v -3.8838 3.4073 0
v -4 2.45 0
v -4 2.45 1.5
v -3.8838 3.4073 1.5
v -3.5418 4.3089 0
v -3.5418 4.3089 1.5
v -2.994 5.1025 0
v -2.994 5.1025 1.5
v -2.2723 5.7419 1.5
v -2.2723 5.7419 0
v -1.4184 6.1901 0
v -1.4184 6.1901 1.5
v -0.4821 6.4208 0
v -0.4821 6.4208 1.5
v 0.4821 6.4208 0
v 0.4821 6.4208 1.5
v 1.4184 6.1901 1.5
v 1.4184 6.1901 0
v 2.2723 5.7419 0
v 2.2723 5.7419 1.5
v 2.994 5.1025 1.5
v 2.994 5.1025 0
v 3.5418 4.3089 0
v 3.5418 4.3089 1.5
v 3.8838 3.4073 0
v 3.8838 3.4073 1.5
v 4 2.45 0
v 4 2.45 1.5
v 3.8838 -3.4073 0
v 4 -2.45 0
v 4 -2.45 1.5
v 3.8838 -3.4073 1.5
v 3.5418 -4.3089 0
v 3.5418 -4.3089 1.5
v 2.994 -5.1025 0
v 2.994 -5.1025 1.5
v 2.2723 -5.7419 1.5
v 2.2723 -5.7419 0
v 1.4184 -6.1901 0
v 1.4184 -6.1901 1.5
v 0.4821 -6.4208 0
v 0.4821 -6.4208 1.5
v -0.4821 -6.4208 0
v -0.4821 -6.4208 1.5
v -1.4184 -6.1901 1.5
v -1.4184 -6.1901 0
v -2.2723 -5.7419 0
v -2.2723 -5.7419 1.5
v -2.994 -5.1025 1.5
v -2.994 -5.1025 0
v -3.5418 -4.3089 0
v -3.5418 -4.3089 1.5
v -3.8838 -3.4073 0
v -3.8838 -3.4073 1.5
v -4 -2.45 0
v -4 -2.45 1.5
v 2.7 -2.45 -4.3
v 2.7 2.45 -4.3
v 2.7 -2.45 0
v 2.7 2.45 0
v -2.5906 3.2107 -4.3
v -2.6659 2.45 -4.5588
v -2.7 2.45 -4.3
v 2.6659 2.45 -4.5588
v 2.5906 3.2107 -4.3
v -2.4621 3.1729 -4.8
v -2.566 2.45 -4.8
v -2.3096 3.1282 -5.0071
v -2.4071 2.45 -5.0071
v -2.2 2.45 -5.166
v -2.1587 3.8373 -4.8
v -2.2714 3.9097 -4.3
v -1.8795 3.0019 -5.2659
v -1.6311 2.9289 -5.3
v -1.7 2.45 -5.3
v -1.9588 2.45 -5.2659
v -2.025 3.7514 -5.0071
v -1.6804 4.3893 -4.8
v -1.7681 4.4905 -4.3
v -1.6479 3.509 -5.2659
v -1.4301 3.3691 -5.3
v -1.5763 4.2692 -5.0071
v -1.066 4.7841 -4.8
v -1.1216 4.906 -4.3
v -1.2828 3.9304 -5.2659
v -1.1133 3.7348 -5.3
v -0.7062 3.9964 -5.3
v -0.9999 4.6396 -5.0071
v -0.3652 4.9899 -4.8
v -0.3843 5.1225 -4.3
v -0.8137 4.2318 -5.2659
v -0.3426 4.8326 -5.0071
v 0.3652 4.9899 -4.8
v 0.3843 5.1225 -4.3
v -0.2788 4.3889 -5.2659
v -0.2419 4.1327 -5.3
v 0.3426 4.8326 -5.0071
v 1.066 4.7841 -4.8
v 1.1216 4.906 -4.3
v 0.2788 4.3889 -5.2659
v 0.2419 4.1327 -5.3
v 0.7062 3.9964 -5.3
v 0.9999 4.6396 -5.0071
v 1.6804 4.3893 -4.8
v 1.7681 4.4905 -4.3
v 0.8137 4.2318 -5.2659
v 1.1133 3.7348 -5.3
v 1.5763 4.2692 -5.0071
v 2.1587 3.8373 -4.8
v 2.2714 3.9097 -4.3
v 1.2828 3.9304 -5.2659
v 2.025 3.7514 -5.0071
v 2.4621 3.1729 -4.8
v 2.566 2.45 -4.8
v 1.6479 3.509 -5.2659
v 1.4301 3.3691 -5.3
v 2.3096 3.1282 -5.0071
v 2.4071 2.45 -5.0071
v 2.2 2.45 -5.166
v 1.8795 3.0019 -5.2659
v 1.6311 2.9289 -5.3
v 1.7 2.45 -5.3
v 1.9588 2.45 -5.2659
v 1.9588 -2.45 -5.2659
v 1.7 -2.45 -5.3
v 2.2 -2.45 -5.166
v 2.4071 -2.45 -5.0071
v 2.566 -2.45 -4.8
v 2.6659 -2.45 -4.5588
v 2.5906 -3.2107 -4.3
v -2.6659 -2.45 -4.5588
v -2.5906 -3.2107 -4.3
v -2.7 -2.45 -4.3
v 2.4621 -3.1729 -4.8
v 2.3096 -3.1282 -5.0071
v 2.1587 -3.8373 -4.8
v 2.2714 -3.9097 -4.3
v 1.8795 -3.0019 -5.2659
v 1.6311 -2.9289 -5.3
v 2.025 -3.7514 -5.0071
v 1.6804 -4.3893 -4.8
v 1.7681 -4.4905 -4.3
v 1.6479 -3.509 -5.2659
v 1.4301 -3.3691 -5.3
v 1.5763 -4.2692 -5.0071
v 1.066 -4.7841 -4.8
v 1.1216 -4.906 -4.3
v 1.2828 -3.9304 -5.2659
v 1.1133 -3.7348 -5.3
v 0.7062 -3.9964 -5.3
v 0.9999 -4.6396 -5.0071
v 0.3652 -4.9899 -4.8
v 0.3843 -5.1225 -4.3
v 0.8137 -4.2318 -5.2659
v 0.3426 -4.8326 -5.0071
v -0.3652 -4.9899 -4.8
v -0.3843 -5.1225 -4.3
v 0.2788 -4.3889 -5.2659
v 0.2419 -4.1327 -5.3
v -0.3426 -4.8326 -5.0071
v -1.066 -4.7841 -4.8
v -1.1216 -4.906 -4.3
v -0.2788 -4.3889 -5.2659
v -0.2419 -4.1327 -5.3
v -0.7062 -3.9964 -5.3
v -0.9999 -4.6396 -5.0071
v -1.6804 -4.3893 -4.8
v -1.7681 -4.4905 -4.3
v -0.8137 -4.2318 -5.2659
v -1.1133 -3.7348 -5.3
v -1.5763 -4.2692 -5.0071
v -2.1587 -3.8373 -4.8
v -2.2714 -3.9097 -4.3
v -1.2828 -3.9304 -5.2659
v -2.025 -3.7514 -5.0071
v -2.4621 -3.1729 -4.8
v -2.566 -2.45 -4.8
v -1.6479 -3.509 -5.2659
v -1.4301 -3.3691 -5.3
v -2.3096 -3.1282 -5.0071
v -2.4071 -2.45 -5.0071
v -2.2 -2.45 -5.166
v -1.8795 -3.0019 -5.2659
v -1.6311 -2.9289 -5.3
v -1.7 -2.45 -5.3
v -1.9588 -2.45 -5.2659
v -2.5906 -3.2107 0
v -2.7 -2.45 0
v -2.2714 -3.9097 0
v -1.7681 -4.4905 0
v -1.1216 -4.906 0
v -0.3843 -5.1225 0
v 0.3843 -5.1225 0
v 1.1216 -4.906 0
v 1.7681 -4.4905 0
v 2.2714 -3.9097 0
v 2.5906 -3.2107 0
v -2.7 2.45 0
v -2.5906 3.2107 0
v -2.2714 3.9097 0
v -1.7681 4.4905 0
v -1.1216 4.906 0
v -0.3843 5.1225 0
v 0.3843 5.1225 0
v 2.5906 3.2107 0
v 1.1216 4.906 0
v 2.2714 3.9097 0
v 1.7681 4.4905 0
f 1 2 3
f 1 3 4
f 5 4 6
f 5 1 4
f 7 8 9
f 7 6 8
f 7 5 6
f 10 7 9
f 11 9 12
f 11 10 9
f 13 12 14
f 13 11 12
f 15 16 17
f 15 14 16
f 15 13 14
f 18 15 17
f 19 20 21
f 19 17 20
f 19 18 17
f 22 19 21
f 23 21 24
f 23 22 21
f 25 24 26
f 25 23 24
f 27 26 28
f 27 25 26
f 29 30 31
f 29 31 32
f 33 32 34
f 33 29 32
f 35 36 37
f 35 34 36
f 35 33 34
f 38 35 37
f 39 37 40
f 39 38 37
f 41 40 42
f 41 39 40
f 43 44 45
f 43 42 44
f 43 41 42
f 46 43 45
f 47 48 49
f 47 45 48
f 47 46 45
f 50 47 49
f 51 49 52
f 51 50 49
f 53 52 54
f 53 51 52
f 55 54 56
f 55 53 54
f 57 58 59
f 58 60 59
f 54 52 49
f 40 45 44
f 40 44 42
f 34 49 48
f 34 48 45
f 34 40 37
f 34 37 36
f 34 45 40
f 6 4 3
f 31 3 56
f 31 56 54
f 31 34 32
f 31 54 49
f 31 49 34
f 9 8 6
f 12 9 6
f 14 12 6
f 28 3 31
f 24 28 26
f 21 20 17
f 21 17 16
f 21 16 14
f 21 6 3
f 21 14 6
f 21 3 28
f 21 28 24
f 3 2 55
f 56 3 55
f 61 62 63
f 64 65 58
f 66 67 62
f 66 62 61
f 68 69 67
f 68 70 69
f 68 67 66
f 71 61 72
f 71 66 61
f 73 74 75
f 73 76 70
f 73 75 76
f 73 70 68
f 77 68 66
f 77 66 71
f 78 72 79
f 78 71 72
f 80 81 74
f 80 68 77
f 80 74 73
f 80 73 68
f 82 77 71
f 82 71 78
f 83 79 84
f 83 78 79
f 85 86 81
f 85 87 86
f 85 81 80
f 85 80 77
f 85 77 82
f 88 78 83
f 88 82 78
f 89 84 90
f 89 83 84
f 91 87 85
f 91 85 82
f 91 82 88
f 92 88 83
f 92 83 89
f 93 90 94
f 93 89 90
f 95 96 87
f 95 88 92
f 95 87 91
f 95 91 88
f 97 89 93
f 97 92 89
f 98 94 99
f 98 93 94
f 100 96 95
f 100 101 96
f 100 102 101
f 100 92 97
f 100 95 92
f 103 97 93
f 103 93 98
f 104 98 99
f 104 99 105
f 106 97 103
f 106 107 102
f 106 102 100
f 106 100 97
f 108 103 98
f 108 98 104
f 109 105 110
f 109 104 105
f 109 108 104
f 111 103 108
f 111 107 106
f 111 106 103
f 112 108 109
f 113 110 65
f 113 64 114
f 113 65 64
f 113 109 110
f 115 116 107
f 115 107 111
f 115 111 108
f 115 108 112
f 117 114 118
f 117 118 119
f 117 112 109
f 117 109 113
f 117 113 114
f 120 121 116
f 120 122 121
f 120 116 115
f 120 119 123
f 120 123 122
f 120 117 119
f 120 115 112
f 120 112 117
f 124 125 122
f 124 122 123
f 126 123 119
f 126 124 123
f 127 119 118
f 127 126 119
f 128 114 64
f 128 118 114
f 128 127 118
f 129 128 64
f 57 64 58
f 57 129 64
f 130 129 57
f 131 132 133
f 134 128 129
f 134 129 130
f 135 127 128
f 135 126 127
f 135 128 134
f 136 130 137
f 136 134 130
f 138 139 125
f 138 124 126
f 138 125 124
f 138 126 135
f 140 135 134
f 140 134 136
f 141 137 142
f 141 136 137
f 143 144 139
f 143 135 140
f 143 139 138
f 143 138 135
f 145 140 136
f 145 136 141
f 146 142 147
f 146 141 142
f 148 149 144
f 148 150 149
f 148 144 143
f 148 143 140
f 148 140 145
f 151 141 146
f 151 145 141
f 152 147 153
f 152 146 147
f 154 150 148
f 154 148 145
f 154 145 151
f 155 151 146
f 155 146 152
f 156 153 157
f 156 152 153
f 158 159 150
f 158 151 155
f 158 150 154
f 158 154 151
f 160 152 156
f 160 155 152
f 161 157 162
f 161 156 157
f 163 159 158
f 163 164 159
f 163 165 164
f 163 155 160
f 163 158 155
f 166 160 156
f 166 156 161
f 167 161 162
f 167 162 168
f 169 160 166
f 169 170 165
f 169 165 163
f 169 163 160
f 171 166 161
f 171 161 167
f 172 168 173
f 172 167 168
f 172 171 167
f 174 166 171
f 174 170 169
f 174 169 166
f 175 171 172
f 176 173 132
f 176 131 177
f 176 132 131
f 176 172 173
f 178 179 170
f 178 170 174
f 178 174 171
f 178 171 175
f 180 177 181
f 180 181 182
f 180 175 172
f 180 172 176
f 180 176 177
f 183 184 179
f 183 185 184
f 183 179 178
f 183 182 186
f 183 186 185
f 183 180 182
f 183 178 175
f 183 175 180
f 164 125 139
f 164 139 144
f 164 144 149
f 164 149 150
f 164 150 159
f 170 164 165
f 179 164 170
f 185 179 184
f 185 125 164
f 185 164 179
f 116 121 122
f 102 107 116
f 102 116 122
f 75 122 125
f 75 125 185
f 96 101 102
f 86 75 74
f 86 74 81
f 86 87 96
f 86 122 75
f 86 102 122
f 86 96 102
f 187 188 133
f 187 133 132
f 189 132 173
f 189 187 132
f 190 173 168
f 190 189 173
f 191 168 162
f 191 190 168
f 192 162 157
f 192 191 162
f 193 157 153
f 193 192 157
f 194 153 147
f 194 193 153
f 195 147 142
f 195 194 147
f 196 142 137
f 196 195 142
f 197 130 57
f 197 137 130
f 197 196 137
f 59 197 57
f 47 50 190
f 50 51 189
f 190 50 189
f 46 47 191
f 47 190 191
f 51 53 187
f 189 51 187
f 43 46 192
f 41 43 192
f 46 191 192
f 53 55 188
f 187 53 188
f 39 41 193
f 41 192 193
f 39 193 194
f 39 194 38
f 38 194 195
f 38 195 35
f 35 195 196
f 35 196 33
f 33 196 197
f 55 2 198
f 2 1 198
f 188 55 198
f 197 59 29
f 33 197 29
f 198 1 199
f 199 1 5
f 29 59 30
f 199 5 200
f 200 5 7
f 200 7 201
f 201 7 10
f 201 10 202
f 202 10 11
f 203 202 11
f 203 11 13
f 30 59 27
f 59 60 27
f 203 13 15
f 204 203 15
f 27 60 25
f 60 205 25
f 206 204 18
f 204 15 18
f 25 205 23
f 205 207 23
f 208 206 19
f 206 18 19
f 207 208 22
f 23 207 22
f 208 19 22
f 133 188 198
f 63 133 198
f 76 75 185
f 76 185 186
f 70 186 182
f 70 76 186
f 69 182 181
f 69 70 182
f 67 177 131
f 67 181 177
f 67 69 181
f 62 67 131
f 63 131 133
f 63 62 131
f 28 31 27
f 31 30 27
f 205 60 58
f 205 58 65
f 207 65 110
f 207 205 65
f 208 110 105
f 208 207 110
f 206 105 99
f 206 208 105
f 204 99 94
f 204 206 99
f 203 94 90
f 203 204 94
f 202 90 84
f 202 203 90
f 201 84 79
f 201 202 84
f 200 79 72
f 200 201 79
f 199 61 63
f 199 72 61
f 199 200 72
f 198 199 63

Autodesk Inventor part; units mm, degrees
ref_plane "YZ Plane" through (0, 0, 0) normal (1, 0, 0) x (0, 1, 0)
ref_plane "XZ Plane" through (0, 0, 0) normal (0, 1, 0) x (-1, 0, 0)
ref_plane "XY Plane" through (0, 0, 0) normal (0, 0, 1) x (1, 0, 0)
sketch "Sketch1" plane through (0, 0, 0) normal (0, 0, 1) x (1, 0, 0)
  line L0 (0, -2.45) -> (0, 2.45) construction
  line L1 (4, -2.45) -> (4, 2.45)
  line L2 (-4, 2.45) -> (-4, -2.45)
  arc A0 (-4, -2.45) -> (4, -2.45) centre (0, -2.45) ccw
  arc A1 (4, 2.45) -> (-4, 2.45) centre (0, 2.45) ccw
  point P0 (0, 0)
  dimension "d0" = 2.45
  dimension "d1" = 8
extrude "Extrusion1" add sketch "Sketch1" along normal blind 1.5
sketch "Sketch2" plane through (0, 0, 0) normal (0, 0, -1) x (-1, 0, 0)
  line L0 (-4, -2.45) -> (-4, 2.45) projected
  arc A0 (-4, -2.45) -> (4, -2.45) centre (0, -2.45) ccw projected
  line L1 (4, 2.45) -> (4, -2.45) projected
  arc A1 (4, 2.45) -> (-4, 2.45) centre (0, 2.45) ccw projected
  line L2 (-2.7, 2.45) -> (-2.7, -2.45)
  arc A2 (-2.7, -2.45) -> (2.7, -2.45) centre (0, -2.45) ccw
  line L3 (2.7, -2.45) -> (2.7, 2.45)
  arc A3 (2.7, 2.45) -> (-2.7, 2.45) centre (0, 2.45) ccw
  point P0 (0, 0)
  dimension "d4" = 1.3
extrude "Extrusion2" add sketch "Sketch2" along normal blind 5.3 contours A3 L3 A2 L2
fillet "Fillet1" radius 1 4 edges at (2.7, 0, -5.3) (0, -5.15, -5.3) (-2.7, 0, -5.3) (0, 5.15, -5.3)
properties part number "LCDButton" material "ABS Plastic"
